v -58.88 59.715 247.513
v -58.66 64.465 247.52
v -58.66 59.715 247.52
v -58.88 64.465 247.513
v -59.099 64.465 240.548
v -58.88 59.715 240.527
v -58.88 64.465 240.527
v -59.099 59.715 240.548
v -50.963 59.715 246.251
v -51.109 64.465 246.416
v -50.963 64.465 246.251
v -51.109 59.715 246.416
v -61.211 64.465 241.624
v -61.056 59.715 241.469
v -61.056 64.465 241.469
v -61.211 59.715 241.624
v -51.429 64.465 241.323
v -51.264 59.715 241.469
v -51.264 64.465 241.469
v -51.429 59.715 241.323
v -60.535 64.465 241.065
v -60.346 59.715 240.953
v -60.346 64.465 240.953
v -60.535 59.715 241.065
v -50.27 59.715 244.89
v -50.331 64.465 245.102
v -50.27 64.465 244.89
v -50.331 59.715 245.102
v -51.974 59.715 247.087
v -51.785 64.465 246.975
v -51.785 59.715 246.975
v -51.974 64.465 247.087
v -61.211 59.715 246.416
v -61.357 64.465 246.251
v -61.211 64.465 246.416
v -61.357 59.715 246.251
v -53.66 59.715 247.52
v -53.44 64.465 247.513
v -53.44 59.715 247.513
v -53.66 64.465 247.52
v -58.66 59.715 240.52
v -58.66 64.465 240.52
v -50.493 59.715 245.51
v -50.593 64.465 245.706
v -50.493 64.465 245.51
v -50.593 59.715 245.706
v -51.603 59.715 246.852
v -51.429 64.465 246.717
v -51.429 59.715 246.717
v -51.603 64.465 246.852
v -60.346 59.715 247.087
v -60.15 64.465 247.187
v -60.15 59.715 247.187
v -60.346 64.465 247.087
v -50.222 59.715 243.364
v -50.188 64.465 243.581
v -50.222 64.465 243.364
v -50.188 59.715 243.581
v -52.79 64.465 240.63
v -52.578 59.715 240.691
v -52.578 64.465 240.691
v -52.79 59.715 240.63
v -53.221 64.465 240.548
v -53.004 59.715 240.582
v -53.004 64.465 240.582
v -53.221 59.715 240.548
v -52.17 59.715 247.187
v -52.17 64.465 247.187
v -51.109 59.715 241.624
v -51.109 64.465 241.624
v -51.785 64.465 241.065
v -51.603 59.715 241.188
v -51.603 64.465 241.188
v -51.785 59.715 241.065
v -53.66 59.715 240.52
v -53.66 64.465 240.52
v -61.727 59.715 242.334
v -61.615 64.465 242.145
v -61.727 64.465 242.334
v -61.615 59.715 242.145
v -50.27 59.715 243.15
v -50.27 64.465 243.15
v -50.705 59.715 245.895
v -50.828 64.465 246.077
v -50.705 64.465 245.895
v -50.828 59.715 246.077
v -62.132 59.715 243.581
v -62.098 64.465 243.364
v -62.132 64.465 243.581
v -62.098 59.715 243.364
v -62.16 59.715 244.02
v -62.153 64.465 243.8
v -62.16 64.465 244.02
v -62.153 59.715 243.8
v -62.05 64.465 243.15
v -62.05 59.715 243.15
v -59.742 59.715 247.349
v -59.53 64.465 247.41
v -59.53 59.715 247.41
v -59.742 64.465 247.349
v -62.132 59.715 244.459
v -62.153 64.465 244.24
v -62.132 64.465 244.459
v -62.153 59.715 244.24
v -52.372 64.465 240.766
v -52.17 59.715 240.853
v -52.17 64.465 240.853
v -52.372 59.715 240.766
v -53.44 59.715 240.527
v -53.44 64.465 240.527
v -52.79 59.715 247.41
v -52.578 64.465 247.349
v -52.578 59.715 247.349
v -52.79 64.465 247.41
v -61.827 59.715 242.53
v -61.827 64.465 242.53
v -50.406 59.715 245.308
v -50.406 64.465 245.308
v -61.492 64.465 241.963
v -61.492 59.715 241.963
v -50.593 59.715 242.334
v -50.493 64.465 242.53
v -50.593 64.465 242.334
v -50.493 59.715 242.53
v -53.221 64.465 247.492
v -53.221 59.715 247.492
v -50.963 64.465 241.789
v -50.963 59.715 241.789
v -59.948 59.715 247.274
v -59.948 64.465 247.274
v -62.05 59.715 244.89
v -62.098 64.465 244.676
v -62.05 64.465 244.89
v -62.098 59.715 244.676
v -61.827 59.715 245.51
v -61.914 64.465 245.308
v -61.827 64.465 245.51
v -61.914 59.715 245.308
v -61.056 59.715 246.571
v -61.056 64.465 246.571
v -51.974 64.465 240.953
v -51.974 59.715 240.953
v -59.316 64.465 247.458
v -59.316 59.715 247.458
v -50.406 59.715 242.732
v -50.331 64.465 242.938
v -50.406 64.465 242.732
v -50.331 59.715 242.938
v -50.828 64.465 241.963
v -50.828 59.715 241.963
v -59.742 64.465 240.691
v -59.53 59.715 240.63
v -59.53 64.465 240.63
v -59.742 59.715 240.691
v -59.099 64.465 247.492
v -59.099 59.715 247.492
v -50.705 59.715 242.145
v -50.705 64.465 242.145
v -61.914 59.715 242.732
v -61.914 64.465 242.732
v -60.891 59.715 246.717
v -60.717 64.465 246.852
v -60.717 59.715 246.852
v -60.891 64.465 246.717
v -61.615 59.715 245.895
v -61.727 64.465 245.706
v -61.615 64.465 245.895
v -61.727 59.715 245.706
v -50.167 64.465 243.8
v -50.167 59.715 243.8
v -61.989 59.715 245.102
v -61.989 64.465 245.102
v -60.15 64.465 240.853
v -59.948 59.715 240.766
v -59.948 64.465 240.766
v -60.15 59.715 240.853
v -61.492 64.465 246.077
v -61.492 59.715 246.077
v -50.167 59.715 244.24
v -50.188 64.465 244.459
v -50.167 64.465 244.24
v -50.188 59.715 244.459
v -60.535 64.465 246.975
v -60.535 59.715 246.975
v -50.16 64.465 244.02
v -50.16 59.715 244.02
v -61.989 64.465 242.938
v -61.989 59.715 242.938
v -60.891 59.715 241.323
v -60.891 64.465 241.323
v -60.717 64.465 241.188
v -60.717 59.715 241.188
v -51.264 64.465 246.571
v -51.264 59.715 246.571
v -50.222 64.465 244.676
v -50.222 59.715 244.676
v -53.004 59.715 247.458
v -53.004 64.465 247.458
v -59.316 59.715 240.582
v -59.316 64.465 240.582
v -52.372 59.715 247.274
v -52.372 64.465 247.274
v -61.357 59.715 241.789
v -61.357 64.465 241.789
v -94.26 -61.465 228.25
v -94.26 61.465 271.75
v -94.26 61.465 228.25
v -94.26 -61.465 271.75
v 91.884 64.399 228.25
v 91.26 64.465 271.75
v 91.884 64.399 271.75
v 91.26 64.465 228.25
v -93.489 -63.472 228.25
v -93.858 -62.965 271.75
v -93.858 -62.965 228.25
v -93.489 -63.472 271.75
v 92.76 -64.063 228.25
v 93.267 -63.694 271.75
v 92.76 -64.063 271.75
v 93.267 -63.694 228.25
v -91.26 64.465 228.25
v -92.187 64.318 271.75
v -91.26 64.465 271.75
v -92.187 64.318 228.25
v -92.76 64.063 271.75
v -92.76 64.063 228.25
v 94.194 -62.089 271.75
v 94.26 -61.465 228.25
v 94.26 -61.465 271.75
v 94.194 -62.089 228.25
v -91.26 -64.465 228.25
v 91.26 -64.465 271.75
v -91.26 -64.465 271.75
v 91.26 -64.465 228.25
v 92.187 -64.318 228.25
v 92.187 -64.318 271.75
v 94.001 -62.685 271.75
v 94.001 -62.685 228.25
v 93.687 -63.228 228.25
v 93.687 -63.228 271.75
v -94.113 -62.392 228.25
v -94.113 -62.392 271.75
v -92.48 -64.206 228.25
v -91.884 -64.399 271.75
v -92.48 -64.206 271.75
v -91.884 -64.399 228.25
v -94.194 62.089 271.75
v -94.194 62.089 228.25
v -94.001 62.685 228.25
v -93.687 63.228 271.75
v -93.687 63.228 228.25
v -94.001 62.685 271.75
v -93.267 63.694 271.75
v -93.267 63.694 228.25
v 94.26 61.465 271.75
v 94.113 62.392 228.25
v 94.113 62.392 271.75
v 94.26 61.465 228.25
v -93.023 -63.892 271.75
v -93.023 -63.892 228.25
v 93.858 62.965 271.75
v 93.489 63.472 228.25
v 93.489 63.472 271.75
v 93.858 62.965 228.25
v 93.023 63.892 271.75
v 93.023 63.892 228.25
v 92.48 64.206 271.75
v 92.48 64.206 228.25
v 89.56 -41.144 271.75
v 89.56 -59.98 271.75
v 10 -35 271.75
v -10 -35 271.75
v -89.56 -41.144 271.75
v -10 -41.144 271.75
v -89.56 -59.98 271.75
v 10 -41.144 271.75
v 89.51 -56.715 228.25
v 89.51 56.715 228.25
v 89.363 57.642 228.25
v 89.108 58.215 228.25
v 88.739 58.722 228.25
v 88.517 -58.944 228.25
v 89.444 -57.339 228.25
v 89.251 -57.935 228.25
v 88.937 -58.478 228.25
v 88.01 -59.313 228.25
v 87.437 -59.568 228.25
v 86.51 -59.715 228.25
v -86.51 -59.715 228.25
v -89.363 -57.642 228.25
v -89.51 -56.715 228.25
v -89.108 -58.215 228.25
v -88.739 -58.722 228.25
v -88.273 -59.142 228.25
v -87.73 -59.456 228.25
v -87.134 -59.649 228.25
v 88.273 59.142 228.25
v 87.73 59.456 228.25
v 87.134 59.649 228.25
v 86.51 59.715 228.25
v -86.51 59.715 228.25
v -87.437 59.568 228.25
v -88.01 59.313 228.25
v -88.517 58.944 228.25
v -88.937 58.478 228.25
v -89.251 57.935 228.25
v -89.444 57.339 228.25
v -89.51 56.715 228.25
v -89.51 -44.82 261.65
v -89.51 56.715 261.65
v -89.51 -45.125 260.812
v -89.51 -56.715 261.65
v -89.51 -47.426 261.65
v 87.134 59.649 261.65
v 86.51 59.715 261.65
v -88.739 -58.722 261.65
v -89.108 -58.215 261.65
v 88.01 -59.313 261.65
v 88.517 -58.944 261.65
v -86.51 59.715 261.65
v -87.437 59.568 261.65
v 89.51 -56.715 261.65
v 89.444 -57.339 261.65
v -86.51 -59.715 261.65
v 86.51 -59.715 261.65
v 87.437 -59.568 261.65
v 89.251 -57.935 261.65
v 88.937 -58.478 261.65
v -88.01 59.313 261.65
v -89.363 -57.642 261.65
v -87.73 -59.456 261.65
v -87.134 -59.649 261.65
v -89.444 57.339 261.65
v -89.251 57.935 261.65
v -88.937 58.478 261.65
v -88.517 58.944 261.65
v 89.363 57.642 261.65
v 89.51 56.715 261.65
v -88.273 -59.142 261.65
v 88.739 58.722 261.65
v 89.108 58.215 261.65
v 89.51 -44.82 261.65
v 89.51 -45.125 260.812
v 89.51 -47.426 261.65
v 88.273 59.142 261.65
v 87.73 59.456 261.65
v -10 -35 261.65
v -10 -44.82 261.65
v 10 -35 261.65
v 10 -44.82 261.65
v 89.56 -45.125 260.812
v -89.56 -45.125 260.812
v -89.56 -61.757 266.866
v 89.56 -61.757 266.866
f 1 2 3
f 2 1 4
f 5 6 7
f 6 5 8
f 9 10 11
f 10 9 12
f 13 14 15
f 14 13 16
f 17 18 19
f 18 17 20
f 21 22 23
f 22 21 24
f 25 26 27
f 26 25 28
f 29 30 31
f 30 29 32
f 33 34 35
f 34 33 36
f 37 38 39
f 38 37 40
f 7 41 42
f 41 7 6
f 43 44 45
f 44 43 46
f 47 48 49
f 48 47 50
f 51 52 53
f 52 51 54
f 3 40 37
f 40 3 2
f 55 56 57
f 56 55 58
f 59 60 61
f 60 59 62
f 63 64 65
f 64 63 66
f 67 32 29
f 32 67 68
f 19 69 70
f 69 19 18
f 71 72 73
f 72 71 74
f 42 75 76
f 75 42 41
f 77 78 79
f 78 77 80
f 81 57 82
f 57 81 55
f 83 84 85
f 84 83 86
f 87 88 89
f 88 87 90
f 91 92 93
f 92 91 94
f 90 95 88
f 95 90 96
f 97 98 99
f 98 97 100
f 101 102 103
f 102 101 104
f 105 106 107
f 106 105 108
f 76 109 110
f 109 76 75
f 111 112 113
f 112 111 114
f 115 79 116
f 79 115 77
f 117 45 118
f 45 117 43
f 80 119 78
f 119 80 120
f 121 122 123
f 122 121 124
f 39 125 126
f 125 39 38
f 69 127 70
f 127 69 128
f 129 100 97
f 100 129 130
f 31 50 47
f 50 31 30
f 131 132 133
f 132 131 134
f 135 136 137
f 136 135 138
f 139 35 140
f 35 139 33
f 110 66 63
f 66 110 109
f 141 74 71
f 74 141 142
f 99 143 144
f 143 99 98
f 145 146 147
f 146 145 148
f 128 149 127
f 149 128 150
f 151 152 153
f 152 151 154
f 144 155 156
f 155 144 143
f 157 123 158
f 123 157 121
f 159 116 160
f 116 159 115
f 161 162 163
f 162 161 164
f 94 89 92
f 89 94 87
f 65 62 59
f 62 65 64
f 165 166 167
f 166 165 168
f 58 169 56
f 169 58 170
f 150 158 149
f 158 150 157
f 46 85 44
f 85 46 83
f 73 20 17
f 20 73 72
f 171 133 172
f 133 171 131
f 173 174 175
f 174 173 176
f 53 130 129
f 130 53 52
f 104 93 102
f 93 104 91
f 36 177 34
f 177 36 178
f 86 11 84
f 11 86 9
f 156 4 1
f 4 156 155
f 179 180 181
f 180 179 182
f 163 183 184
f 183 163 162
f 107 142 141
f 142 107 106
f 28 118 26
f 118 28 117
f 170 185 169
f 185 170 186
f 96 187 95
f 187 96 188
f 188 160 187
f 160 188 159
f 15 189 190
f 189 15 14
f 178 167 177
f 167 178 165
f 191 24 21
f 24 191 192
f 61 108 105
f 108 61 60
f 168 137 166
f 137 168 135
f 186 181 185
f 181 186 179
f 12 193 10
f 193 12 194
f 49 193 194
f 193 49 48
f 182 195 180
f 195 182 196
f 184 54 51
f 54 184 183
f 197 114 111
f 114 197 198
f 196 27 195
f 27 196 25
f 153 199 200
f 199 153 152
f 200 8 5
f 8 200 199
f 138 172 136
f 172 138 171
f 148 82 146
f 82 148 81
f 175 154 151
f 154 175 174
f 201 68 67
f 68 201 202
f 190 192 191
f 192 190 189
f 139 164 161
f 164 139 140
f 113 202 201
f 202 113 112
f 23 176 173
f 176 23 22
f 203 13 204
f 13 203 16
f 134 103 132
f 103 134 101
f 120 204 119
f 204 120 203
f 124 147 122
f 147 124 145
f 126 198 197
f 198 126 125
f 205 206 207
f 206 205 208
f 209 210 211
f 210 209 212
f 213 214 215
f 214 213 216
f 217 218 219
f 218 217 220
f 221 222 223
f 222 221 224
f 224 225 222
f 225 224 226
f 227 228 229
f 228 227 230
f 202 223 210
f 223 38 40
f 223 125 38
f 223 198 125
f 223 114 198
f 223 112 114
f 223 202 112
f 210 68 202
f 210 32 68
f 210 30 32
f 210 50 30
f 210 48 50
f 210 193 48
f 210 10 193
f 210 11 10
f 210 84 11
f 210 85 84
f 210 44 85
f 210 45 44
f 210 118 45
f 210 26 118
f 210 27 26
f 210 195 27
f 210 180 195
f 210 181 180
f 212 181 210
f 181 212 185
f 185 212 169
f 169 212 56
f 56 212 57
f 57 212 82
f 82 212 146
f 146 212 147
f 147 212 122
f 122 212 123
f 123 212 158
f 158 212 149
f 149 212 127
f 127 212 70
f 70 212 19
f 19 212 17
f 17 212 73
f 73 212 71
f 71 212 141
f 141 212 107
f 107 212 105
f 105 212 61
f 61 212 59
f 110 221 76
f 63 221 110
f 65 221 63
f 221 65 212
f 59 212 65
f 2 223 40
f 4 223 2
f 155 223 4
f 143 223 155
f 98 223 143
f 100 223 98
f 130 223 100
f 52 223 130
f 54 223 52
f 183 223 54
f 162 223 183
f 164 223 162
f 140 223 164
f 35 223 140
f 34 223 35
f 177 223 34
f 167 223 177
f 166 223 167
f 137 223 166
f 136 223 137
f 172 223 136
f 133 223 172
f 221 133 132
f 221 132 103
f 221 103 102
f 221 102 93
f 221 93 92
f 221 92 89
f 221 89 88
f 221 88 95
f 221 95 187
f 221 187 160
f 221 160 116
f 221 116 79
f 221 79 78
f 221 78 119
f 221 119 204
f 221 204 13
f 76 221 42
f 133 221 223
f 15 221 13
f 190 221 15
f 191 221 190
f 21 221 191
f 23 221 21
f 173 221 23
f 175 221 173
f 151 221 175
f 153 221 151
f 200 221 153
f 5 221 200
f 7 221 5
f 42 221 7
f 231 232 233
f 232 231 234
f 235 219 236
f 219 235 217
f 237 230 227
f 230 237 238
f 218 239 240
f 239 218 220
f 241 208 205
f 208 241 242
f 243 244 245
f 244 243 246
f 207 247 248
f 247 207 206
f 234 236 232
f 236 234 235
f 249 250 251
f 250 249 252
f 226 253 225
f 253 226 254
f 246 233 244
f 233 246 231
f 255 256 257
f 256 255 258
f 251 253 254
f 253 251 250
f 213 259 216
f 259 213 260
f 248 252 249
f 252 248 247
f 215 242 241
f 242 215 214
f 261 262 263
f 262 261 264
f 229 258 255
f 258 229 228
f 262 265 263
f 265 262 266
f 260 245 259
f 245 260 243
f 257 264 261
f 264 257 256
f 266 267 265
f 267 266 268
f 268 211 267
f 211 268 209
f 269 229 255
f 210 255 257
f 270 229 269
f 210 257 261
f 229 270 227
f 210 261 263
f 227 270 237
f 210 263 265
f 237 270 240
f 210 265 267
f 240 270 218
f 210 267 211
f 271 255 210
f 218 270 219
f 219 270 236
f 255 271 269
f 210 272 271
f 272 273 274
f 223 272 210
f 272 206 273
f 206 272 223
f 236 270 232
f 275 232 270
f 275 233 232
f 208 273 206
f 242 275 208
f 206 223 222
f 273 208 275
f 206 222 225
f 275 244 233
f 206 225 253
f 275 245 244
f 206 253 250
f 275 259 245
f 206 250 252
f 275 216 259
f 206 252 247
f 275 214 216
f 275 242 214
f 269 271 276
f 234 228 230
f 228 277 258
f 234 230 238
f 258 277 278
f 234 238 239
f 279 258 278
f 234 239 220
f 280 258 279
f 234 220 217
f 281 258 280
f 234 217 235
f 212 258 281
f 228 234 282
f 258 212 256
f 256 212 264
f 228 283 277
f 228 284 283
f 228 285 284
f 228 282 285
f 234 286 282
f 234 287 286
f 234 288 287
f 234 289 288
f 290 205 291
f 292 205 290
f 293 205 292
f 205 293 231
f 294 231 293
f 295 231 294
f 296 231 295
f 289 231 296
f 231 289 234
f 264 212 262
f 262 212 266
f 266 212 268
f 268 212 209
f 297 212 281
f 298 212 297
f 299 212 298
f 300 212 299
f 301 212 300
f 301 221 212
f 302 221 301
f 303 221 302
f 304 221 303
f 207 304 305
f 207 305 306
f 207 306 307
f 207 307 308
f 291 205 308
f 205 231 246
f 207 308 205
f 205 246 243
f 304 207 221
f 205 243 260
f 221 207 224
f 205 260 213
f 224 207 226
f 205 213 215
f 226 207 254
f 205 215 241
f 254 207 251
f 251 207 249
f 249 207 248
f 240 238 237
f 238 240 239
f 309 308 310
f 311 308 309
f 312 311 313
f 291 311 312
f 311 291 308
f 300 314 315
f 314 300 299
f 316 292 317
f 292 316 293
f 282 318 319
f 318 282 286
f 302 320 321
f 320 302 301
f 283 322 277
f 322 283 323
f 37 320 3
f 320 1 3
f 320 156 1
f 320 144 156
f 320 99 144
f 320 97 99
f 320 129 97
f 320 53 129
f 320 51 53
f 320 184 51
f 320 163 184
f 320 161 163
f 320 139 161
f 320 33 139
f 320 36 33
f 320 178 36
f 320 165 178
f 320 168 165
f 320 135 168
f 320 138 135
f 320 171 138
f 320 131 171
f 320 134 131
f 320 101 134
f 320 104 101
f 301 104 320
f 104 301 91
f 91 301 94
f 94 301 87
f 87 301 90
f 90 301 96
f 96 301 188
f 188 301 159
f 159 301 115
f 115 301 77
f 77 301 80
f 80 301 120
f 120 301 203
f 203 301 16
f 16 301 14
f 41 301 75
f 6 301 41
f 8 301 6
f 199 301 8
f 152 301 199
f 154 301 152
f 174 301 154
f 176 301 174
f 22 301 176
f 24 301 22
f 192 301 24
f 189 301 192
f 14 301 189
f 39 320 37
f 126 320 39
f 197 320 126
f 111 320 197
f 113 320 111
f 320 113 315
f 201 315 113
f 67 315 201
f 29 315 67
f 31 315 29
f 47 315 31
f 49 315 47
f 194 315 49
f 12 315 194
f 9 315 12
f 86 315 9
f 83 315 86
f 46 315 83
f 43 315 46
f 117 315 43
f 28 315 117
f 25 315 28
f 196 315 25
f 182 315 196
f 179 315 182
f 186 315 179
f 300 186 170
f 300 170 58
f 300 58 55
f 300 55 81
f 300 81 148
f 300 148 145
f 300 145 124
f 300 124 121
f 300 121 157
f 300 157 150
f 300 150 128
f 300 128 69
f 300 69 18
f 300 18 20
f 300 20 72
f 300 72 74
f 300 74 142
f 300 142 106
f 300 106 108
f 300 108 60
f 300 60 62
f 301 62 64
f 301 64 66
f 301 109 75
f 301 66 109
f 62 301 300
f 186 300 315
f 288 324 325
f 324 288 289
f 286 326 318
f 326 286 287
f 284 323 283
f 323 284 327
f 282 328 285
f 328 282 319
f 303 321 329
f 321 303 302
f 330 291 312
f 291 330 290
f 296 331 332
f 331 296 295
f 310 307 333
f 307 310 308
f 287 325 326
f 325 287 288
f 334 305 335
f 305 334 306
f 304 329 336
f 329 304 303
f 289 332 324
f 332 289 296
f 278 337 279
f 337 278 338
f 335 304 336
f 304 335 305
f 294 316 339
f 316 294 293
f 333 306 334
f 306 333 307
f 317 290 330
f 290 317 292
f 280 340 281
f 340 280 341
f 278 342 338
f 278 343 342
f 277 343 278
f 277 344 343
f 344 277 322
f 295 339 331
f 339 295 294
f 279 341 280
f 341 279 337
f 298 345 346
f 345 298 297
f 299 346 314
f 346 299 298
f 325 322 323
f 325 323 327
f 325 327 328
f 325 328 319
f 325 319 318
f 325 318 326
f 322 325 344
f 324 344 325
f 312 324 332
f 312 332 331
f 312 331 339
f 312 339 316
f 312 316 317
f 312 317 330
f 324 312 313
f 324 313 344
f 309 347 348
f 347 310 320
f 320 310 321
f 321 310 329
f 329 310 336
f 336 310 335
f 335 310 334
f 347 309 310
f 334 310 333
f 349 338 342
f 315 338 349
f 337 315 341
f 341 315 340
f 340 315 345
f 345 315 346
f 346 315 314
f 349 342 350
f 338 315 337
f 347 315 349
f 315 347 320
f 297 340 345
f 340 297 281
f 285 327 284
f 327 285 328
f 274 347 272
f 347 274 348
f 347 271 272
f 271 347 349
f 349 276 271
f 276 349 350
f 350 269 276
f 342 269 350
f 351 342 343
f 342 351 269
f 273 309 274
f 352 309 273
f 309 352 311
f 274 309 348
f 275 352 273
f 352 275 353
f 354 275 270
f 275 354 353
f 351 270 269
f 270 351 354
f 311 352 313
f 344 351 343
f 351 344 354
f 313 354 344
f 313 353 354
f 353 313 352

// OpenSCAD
// file: usbA-C.scad
/* [Hidden] */

TWEAK = 1;

module make_USBA(location = "UNKNOWN")
{
     // true measurements of usb.
     PUNCH_DIA = 6 + TWEAK;
     PUNCH_WIDTH = 11.0 + TWEAK;
     PUNCH_DIST = PUNCH_WIDTH - PUNCH_DIA;
     PUNCH_LENGTH = 17.0;

     // this is the hole punch size
     USB_DIA = 1.92 + TWEAK/2;
     USB_WIDTH = 7.0 + TWEAK/2;
     USB_DIST = PUNCH_WIDTH - PUNCH_DIA;
     USB_LENGTH = 5.68;
    

    mUSB_DIA = (location == "ABOVE") ? +USB_DIA/2 : location == "BELOW" ? -USB_DIA/2: 0;
    
    translate([ 0, mUSB_DIA, 0])  
    {
         if ($preview)
         {
             color("PINK")
             translate( [-PUNCH_WIDTH , -mUSB_DIA, 0])  // one face to sit 'on the board'
             rotate([90, 90, 0])
             cube( [PUNCH_WIDTH * 2, PUNCH_WIDTH * 2, 0.1], center = false);    // targeting plane
         }
         
         //translate( [0, USB_DIA/2, 0])  // one face to sit 'on the board'
         {
             color("YELLOW", .3)
             hull()
             {
                 translate([ PUNCH_DIST /2, 0, 0 ])
                 cylinder(h = PUNCH_LENGTH, d = PUNCH_DIA, $fn=100);
                 
                 translate([ -PUNCH_DIST /2, 0, 0 ])
                 cylinder(h = PUNCH_LENGTH, d = PUNCH_DIA, $fn=100);
             }
             
             rotate([180, 0, 0])
             #hull()
             {
                 translate([ USB_DIST /2, 0, 0 ])
                 cylinder(h = USB_LENGTH, d = USB_DIA, $fn=100);
                 
                 translate([ -USB_DIST /2, 0, 0 ])
                 cylinder(h = USB_LENGTH, d = USB_DIA, $fn=100);
             }
         }
     }
}

module make_USBC( location = "UNKNOWN")
{
     PUNCH_DIA = 6.10 + TWEAK;
     PUNCH_WIDTH = 10.9 + TWEAK;
     PUNCH_DIST = PUNCH_WIDTH - PUNCH_DIA;
     PUNCH_LENGTH = 14.0;

    // true usb metal dimensions.
     USB_DIA = 2.54 + TWEAK/2;
     USB_WIDTH = 8.25 + TWEAK/2;
     USB_DIST = PUNCH_WIDTH - PUNCH_DIA;
     USB_LENGTH = 7.47;

    mUSB_DIA = (location == "ABOVE") ? +USB_DIA/2 : location == "BELOW" ? -USB_DIA/2: 0;
    
    translate([ 0, mUSB_DIA, 0])  
    {
         if ($preview)
         {
             color("GREY")
             translate( [-PUNCH_WIDTH , -mUSB_DIA, 0])  // one face to sit 'on the board'
             rotate([90, 90, 0])
             cube( [PUNCH_WIDTH * 2, PUNCH_WIDTH * 2, 0.1], center = false);    // targeting plane
         }
         
         //translate( [0, USB_DIA/2, 0])  // one face to sit 'on the board'
         {
             color("ORANGE", .3)
             hull()
             {
                 translate([ PUNCH_DIST /2, 0, 0 ])
                 cylinder(h = PUNCH_LENGTH, d = PUNCH_DIA, $fn=100);
                 
                 translate([ -PUNCH_DIST /2, 0, 0 ])
                 cylinder(h = PUNCH_LENGTH, d = PUNCH_DIA, $fn=100);
             }
             
             rotate([180, 0, 0])
             #hull()
             {
                 translate([ USB_DIST /2, 0, 0 ])
                 cylinder(h = USB_LENGTH, d = USB_DIA, $fn=100);
                 
                 translate([ -USB_DIST /2, 0, 0 ])
                 cylinder(h = USB_LENGTH, d = USB_DIA, $fn=100);
             }
         }
     }

}
translate([20, 0, 0])
make_USBA("ABOVE");
translate([40,0, 0])
make_USBA("CENTER");
translate([60, 0, 0])
make_USBA("BELOW");
/*
translate([ 0, 10, 0])
{
    translate([20, 0, 0])
    make_USBC("ABOVE");
    translate([40,0, 0])
    make_USBC("CENTER");
    translate([60, 0, 0])
    make_USBC("BELOW");
}
*/
//make_USBC("CENTER");
// file: myTools.scad
module tube (r = 0, d = 0, l = 0, 
            thick = 0, 
            bCentered = true, 
            taper_pct = 0, 
            circlip = false) // r=radius d=dia l=length 
{
    assert( r != 0 || d != 0, "specify one of radius or diameter");
    assert( l != 0 , "tube: need length 'l' to be non zero");
    assert( thick != 0, "wall thickness cannot be zero");

    punch = $preview ? .2 : 0; // stop funny view artifact

    dia = r ? r * 2 : d;

    od = ((thick > 0) ? dia + thick * 2 : dia);
    id = (thick > 0) ? dia             : dia  + thick *2; 

    
    
    if (thick > 0)
        echo ("tube\tMIN id = ", id, "od = ", od, "wall = ", thick, "center= ", bCentered);
    else
        echo ("tube\tMAX od = ", od, "id = ", id, "wall = ", thick, "center= ", bCentered);

    echo ("tube\tHeigth = ", l);
        
    if (taper_pct != 0)
    {
        echo ("tube\t*** OD expanded by ", taper_pct, "%, : bottom od = ", od * (1. +taper_pct/100), "top od = ", od);
    }
    
    assert(dia || dia < 0, "tube : missing r or d ");
    
    // if taper_pct specified, the base will always be closest to 0,0,0
    translate([ 0, 0, taper_pct == 0 ? 0: bCentered ? l/2:l  ])
    rotate([0, taper_pct == 0 ? 0 : 180, 0 ])

    difference()
    {
        // make a reese's cup
        {
            color("YELLOW", .3)
            linear_extrude(height= l, scale = 1 + taper_pct/100)
                difference()
                {
                    circle(d = od);
                    circle(d = .5);
                }
        }
    
     // hollow out reessed cup
     color("GREEN")
     translate([0, 0, -punch/2])
     linear_extrude(height= l+ punch*2, $fn=100)
     {
        circle(d = id);
        if (circlip) #square([1 + punch, od ]);
     }
    
    }
}
//==============================================================================
        
module abox (dims, 
            thick = 0, 
            bCentered = true, 
            round_out = 0, 
            round_in = 0, 
            bSolid = false,
            bHollow = false,
            elevator = 0)   // move bottom up by X
{
    punch = $preview ? .1 : 0; // stop funny view artifact
    
    assert(thick != 0, "Thick must be specified. +=outside dim, -= inside dims");
    assert(dims.z > thick, "wall thickness too large for depth of box");

    wall2 = abs(thick) * 2; // 2 walls in each direction
    wall = wall2 / 2;
    
    // box either grows inward (thick < 0) or outward (thick > 0)  from dims
    fat = dims + [ wall2, wall2, wall];
    thin = dims - [ wall2, wall2, wall];
    
    offset = (thick > 0 && bCentered == false) ? wall : 0;
    
    //echo ("abox : adjusting x,y,z by ", offset, " to move origin from  center to 0,0,0");
    translate( [ bCentered ? 0 : dims.x /2 + offset, bCentered ? 0 : dims.y /2 + offset, bCentered ? 0 : dims.z /2 + offset/2]) 
    {
        if (thick > 0)
        {   
            // wall grows outwards from users dim
            echo ("making a box, MAX INSIDE dim = ", dims, "a wall=", thick, "mm ... max outside = ", fat, " mm");
        }
        else
        {
            // wall grows inward from users dime
            echo ("making a box, MAX OUTSIDE dim = ", dims, "a wall=", thick, "mm ... min inside = ", thin, " mm");
        }
        
        // linear extrude alway works in the positive x/y plane an goes upward.
        // after calc, re-center about 0,0,0 where a bCentered cube would be
        
        translate([ 0, 0, thick > 0  ? -fat.z/2 : -dims.z/2 ])
        difference()
        {
            echo ("round_out = ", round_out);

            // MAKE SOLID BOX --------------------------------------
            router_outside = round_out ? round_out : 0;
            x = thick > 0  ? fat.x - router_outside : dims.x - router_outside;
            y = thick > 0  ? fat.y - router_outside : dims.y - router_outside;


            // MAKE PUCHNED INSIDE
            // using 'offset' it will add r on all dimensions, then round., 
            // so now you have fatter perimeter than you started with :(
            //  but at least the corners are round.
            
            // Compensate by shrinking dimension by r, 
            // and then by calling offset, offset will then add it back

            color("YELLOW", .2)

            linear_extrude(thick > 0  ? fat.z : dims.z)
            if (round_out)
            {
                offset( r= round_out, $fn=30)
                square( [x - router_outside, y - router_outside], true);
            }
            else square( [x - router_outside, y - router_outside], true);
           
            // time to punch out the inside if requested.
            if (bSolid == false)
            {
                hollow_offset = bHollow ? fat.z/2 + .2  : dims.z/2 +.2;
                // punching out inside. its either dims or thin.
                router_inside = round_in;
                echo ("round_in = ", router_inside);
                xi = thick > 0  ? dims.x  : thin.x;
                yi = thick > 0  ? dims.y : thin.y ;

                color("GREEN")

                // move 'punch' up if you need a bottom else zero (hollowed out)

                translate([ 0,0, bHollow ? -.1 : wall + elevator]) 
                linear_extrude(thick > 0  ? fat.z - wall  + hollow_offset : dims.z - wall + hollow_offset)
                //#linear_extrude(fat.z - wall  + hollow_offset)
                
                if (round_in) 
                {
                    offset( r= round_in, $fn=30)
                    square( [ xi - router_inside, yi - router_inside], true);
                }
                else
                    square( [ xi, yi], true);
            }
        }
    }
 }


// 50x25x10 box walls grow inward (-2). on center origin midpoint
// rounded outside (default), sharp corner inside(default), bCentered about 0,0,0
//color("GREEN", .9)
//abox([50,25, 10], -2, true); 


// 50x25x10 box walls grow inward (-2). on center origin midpoint
// sharp outside corners, rounded inside corners. Sit on x,y plane
color("BLUE", .9)
abox([50,20, 10], +2, round_in=2, bCentered = false);  // 50x25x10 box inside dim origin has 0,0


// 50x25x10 box walls grow inward (-2). on center origin midpoint
// sharp corners inside and out. sits on x,y plane
color("GREY", .9)//
translate([ 55, 0, 0])      
abox([50,20, 10], +2, round_out=3, false);

color("PINK", .9)//
translate([ 115, 10, 10])      
abox([86.66, 56.865, 5], -5, bHollow = true, bCentered = false); 

color("GREEN", .9)//
translate([ 140, 10, -10])      
abox([86.66, 56.865, 5], 3, bHollow = true, bCentered = false); 

/*
// 50x25x10 box walls grow inward (-2). on center origin midpoint
// round corners outside and SOLID
color("BLUE", .9)//
translate([ 55, 0, 0])      
abox([50,25, 10], +2, round_out=2, round_in=0, false, bSolid = true); // 50x25x10 box outside dim origin is 0,0
*/

//translate ([-30,-30, 0])
{
/*
    // tube outer dia  20, inner dia = (20 - 8)
    color("PINK")
    tube (d = 20, l = 20, thick = -8, bCentered = false);

    // tube, inner dia = (2* 10), outer dia = ((2*10) + 2) 
    color("PURPLE", .3)
    tube (r = 10, l = 20, thick = +2, bCentered= true);
*/
/*
    tube (d = 60, l = 20, thick = -6, bCentered = false);

    translate([0, 0, 50])
    tube (d = 60, l = 20, thick = -6, bCentered = false, taper_pct = 20, circlip = true);
    //color("GREEN")
    //tube (d = 20, l = 20, thick = -2, bCentered = false, taper = 10, circlip = true);
*/

}
// main file
use <myTools.scad>
use <usbA-C.scad>

MM=25.43;


bMakeFrame = false; //true;
bMakeBottom = false; //true;
bMakeBackSide = false; //true; //true;
bMakeFoot = false; //true;
bMakeAlt = true;

inside_length = 6 * MM + 17.49 + 1.25;
inside_width = 111.23 + .5 ;
outside_height = 5;
BEZEL_THICK = 3.5;


flex_cable_wide = inside_length - 2 * 74 ;
flex_cable_offset = inside_length - 74;
MYLAR_FEED = [flex_cable_wide, 2, 9 ];


if (bMakeBottom)
{
    difference()
    {
        // don't need box to have max emptyness, raise floor via elevator = 3
        abox([inside_length, inside_width, outside_height], thick = +BEZEL_THICK, elevator = 2);

        translate([ -MYLAR_FEED.x/2,  
                    inside_width/2 - BEZEL_THICK + MYLAR_FEED.y/2 + 2 ,
                    -MYLAR_FEED.z * 3/4 + .5 ])
        color("RED")
        cube(MYLAR_FEED , center = false);
        

    }
}
//----------------------------------------------------------------------------------------

if (bMakeFrame)
{
    //
    //  MAKE HOLD DOWN FRAME

    LCD_WHITE_BOARDER = 1.6 + .5;
    NOTCH = .86;

    translate([ 0,0,50])
    union()
    {
        // don't need box to have max emptyness, raise floor via elevator = 3
        color("CYAN")
        abox([inside_length, inside_width, outside_height], thick = +BEZEL_THICK, bHollow = true, bCentered = true);

        // make small ridge .7mm high on the inside of the frame above
        translate([0, 0 , .7/2])
        color("PURPLE")
        abox([inside_length, inside_width, outside_height * 2 - .7 ],
                thick = -(LCD_WHITE_BOARDER),
                bHollow = true, bCentered=true);

        // hide white frame of display
        // don't need box to have max emptyness, raise floor via elevator = 3
        color("BLUE")
        translate([0, -inside_width/2 + BEZEL_THICK , 0])
        abox([inside_length, LCD_WHITE_BOARDER, outside_height], thick = +BEZEL_THICK, bSolid = true, bCentered = true);


    }
}


box_height = 40;

if (bMakeBackSide)
{
    translate([ 0,0, 120])
    {
        difference()
        {
            color("GREEN", .5)
            rotate([-180, 0, 0])
            {
                abox([inside_length + BEZEL_THICK *2 + .7, 
                      inside_width + BEZEL_THICK *2 + .7, 
                      box_height], 
                      thick = +BEZEL_THICK, 
                      bHollow = false, bCentered = true, round_out=3);
            }
            
            translate([0,0, -box_height/2 +2])
            #cylinder(h = box_height, d= 25.4 * 5 /8);
            
            // position usb from the center line, not from a wall.
            translate([ (inside_length + BEZEL_THICK *3)/2 -2, 
                        (inside_width + BEZEL_THICK *3)/2 - 51, 
                         box_height/2 - 33.8/4])
            rotate([ 90, 0, 90])
            #make_USBA();
        }
    }
}

if (bMakeFoot)
{
    translate([ 0,0, 180])
    {
        difference()
        {
            color("PURPLE", .5)
            rotate([-180, 0, 0])
            {
                abox([inside_length + BEZEL_THICK *2 + .7 + 10,  // foot is bigger 
                      inside_width + BEZEL_THICK *2 + .7 + 10,   // foot is bigger
                      box_height * 4/8],                         // foot is thinner
                      thick = +BEZEL_THICK, 
                      bSolid = true, bCentered = true, round_out=3); // make solid
            }

            
            // punch out the LcD display at an angle.
            translate([ 0, -15, 61]) // just make it catch front lip
            rotate([70, 0, 0])
            {
                abox([inside_length + BEZEL_THICK *2 + .8, 
                      inside_width + BEZEL_THICK *2 + .8, 
                      box_height+ .7], 
                      thick = +BEZEL_THICK, 
                      bSolid = true, bCentered = true, round_out=3);
            }
            
        }
    }
}

if (bMakeAlt)
{
    translate([ 0,0, 250])
    {
        difference()
        {
            color("PURPLE", .3)
            rotate([-180, 0, 0])
            {
                abox([inside_length + BEZEL_THICK  + .7 + 6,  // foot is bigger 
                      inside_width + BEZEL_THICK  + .7 + 6,   // foot is bigger
                      box_height ],                         // foot is thinner
                      thick = +BEZEL_THICK, 
                      bSolid = true, bCentered = true, round_out=3); // make solid
            }
            
            
            // hollow out bottom.
            UP = 5;
            translate([0, 0, -UP -.1])
            rotate([-180, 0, 0])
            {
                abox([inside_length  + .7,  
                      inside_width +  .7,  
                      box_height * 3/4],   
                      thick = +BEZEL_THICK, 
                      bSolid = true, bCentered = true, round_out=3); // make solid
            }

            cutout = [ 20, 10, box_height + BEZEL_THICK];
            translate([ -cutout.x/2 , -cutout.y/2 -30 , cutout.z/2])
            rotate([-180, 0, 0])
            #cube ( cutout);
            
            // position usb from the center line, not from a wall.
            translate([ -(inside_length/2 + BEZEL_THICK *3) +40 , (inside_width/2 + BEZEL_THICK *3) - 10,
                      box_height/2 - UP + BEZEL_THICK - 25.69 ] )
            {
                //#cube([ inside_length, inside_width, .1]);
                rotate([ -90, 0, 0])
                #make_USBA("BELOW");
            }
            // punch out the LcD display at an angle.
            translate([ 0, -33, 70]) // just make it catch front lip
            rotate([70, 0, 0])
            {
                #abox([inside_length + .8, 
                      inside_width + .8, 
                      17 - BEZEL_THICK + .7], 
                      thick = +BEZEL_THICK,  
                      bSolid = true, bCentered = true);
            }
            
        }
    }
}
